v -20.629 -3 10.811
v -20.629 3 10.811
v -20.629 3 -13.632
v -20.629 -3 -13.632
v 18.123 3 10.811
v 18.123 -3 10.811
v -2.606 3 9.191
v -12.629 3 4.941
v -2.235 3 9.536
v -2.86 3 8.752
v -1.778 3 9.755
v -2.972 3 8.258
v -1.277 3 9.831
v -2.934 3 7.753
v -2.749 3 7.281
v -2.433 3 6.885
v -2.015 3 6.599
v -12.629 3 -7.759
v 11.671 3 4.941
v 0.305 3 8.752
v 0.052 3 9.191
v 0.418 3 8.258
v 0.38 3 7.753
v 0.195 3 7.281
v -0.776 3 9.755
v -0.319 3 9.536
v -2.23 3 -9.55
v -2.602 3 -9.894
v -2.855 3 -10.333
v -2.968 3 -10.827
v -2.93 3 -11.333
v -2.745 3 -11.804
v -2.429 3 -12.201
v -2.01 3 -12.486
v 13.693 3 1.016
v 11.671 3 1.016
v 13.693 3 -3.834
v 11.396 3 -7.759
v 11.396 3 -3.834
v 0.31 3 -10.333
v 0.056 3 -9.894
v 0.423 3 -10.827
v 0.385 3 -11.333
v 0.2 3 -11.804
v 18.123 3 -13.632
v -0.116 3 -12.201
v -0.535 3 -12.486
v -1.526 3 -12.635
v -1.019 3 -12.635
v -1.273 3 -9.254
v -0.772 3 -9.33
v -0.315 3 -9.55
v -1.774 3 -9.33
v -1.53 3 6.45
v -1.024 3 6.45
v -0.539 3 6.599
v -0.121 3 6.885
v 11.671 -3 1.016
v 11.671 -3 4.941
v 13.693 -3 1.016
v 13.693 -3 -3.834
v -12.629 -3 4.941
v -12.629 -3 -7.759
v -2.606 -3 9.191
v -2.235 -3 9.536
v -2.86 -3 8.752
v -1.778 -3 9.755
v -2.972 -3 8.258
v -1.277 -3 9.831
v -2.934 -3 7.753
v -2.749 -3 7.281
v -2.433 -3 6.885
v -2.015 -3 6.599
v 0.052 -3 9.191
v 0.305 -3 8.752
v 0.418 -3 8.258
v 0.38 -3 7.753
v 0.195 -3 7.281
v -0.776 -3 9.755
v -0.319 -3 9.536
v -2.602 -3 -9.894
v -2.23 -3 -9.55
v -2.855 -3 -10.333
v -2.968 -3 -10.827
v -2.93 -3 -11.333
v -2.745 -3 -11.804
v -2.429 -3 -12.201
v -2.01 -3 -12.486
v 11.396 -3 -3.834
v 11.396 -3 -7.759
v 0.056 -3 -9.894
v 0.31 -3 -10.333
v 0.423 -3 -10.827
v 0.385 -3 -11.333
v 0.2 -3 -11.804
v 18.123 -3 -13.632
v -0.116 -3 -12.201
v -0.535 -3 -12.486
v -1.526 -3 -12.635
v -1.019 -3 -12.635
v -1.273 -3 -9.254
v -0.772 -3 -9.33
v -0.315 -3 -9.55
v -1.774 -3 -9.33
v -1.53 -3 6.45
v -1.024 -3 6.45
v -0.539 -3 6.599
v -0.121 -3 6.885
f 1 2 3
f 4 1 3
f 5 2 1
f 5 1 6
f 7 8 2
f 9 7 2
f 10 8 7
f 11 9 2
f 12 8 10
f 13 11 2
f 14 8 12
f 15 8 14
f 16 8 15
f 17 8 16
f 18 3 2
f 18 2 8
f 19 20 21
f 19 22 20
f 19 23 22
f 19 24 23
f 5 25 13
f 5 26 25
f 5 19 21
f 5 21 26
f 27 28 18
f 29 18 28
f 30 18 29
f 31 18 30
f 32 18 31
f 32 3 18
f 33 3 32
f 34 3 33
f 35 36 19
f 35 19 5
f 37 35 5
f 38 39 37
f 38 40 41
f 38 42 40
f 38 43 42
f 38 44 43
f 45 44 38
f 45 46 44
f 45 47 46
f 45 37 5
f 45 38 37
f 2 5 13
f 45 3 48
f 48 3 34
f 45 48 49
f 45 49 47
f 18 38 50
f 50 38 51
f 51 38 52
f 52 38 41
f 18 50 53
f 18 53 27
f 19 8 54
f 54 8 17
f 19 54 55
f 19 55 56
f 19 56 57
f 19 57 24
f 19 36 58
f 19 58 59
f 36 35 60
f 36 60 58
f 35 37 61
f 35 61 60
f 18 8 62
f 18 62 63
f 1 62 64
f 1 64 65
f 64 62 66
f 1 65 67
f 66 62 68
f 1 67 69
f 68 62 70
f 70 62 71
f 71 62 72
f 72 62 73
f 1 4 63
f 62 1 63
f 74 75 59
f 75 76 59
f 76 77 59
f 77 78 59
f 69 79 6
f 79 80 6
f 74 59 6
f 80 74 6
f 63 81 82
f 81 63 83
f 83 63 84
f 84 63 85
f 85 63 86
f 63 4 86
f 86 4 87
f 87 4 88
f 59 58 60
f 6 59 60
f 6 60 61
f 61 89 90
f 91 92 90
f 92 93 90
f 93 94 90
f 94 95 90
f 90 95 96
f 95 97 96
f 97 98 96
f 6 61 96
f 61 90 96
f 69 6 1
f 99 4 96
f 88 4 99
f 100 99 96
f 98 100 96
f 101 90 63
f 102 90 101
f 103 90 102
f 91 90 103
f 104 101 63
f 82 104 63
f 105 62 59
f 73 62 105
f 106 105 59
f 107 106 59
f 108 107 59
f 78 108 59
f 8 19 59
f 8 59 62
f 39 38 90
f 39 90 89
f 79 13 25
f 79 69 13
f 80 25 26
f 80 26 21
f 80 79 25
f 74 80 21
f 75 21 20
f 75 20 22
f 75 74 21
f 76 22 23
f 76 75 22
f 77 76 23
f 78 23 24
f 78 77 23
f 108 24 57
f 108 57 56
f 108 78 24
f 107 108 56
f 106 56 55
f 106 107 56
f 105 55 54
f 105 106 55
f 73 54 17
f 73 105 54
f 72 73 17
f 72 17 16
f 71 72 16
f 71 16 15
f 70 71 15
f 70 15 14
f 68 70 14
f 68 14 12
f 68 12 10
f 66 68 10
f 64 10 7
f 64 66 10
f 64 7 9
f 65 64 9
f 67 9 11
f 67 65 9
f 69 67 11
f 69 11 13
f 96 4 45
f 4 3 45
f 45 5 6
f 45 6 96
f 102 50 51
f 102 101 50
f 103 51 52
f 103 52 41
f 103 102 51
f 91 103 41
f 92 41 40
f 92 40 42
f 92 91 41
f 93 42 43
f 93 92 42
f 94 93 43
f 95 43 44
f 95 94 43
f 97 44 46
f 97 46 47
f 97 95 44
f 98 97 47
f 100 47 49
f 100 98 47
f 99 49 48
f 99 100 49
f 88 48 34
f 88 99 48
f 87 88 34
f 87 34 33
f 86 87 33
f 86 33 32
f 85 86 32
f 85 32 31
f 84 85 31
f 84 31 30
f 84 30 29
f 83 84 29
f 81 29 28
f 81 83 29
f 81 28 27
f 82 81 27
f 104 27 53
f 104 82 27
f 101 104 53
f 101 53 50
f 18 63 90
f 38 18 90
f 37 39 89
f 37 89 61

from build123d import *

# Parameters (mm, degrees)
SKETCH2_W           = 38.75194
SKETCH2_H           = 24.44303
SKETCH2_R           = 1.7
BOSS_EXTRUDE1_DEPTH = 3


with BuildPart() as part:
    # Sketch2 → Boss-Extrude1 (new, symmetric)
    with BuildSketch(Plane(origin=(0, 0, 0), x_dir=(1, 0, 0), z_dir=(0, 1, 0))):
        with Locations((-1.253031638, 1.410566346)):
            Rectangle(SKETCH2_W, SKETCH2_H)
        with Locations(Location((-1.272682118, 10.954361346, 0), (0, 0, 270))):
            Circle(SKETCH2_R, mode=Mode.SUBTRACT)
        with Locations(Location((-1.277061638, -8.130948654, 0), (0, 0, 270))):
            Circle(SKETCH2_R, mode=Mode.SUBTRACT)
        Polygon((-12.629001638, 7.759051346), (11.395558827, 7.759051346), (11.395558827, 3.833946346), (13.692948362, 3.833946346), (13.692948362, -1.015843654), (11.670998362, -1.015843654), (11.670998362, -4.940948654), (-12.629001638, -4.940948654), align=None, mode=Mode.SUBTRACT)
    extrude(amount=BOSS_EXTRUDE1_DEPTH, both=True)


solid = part.part
